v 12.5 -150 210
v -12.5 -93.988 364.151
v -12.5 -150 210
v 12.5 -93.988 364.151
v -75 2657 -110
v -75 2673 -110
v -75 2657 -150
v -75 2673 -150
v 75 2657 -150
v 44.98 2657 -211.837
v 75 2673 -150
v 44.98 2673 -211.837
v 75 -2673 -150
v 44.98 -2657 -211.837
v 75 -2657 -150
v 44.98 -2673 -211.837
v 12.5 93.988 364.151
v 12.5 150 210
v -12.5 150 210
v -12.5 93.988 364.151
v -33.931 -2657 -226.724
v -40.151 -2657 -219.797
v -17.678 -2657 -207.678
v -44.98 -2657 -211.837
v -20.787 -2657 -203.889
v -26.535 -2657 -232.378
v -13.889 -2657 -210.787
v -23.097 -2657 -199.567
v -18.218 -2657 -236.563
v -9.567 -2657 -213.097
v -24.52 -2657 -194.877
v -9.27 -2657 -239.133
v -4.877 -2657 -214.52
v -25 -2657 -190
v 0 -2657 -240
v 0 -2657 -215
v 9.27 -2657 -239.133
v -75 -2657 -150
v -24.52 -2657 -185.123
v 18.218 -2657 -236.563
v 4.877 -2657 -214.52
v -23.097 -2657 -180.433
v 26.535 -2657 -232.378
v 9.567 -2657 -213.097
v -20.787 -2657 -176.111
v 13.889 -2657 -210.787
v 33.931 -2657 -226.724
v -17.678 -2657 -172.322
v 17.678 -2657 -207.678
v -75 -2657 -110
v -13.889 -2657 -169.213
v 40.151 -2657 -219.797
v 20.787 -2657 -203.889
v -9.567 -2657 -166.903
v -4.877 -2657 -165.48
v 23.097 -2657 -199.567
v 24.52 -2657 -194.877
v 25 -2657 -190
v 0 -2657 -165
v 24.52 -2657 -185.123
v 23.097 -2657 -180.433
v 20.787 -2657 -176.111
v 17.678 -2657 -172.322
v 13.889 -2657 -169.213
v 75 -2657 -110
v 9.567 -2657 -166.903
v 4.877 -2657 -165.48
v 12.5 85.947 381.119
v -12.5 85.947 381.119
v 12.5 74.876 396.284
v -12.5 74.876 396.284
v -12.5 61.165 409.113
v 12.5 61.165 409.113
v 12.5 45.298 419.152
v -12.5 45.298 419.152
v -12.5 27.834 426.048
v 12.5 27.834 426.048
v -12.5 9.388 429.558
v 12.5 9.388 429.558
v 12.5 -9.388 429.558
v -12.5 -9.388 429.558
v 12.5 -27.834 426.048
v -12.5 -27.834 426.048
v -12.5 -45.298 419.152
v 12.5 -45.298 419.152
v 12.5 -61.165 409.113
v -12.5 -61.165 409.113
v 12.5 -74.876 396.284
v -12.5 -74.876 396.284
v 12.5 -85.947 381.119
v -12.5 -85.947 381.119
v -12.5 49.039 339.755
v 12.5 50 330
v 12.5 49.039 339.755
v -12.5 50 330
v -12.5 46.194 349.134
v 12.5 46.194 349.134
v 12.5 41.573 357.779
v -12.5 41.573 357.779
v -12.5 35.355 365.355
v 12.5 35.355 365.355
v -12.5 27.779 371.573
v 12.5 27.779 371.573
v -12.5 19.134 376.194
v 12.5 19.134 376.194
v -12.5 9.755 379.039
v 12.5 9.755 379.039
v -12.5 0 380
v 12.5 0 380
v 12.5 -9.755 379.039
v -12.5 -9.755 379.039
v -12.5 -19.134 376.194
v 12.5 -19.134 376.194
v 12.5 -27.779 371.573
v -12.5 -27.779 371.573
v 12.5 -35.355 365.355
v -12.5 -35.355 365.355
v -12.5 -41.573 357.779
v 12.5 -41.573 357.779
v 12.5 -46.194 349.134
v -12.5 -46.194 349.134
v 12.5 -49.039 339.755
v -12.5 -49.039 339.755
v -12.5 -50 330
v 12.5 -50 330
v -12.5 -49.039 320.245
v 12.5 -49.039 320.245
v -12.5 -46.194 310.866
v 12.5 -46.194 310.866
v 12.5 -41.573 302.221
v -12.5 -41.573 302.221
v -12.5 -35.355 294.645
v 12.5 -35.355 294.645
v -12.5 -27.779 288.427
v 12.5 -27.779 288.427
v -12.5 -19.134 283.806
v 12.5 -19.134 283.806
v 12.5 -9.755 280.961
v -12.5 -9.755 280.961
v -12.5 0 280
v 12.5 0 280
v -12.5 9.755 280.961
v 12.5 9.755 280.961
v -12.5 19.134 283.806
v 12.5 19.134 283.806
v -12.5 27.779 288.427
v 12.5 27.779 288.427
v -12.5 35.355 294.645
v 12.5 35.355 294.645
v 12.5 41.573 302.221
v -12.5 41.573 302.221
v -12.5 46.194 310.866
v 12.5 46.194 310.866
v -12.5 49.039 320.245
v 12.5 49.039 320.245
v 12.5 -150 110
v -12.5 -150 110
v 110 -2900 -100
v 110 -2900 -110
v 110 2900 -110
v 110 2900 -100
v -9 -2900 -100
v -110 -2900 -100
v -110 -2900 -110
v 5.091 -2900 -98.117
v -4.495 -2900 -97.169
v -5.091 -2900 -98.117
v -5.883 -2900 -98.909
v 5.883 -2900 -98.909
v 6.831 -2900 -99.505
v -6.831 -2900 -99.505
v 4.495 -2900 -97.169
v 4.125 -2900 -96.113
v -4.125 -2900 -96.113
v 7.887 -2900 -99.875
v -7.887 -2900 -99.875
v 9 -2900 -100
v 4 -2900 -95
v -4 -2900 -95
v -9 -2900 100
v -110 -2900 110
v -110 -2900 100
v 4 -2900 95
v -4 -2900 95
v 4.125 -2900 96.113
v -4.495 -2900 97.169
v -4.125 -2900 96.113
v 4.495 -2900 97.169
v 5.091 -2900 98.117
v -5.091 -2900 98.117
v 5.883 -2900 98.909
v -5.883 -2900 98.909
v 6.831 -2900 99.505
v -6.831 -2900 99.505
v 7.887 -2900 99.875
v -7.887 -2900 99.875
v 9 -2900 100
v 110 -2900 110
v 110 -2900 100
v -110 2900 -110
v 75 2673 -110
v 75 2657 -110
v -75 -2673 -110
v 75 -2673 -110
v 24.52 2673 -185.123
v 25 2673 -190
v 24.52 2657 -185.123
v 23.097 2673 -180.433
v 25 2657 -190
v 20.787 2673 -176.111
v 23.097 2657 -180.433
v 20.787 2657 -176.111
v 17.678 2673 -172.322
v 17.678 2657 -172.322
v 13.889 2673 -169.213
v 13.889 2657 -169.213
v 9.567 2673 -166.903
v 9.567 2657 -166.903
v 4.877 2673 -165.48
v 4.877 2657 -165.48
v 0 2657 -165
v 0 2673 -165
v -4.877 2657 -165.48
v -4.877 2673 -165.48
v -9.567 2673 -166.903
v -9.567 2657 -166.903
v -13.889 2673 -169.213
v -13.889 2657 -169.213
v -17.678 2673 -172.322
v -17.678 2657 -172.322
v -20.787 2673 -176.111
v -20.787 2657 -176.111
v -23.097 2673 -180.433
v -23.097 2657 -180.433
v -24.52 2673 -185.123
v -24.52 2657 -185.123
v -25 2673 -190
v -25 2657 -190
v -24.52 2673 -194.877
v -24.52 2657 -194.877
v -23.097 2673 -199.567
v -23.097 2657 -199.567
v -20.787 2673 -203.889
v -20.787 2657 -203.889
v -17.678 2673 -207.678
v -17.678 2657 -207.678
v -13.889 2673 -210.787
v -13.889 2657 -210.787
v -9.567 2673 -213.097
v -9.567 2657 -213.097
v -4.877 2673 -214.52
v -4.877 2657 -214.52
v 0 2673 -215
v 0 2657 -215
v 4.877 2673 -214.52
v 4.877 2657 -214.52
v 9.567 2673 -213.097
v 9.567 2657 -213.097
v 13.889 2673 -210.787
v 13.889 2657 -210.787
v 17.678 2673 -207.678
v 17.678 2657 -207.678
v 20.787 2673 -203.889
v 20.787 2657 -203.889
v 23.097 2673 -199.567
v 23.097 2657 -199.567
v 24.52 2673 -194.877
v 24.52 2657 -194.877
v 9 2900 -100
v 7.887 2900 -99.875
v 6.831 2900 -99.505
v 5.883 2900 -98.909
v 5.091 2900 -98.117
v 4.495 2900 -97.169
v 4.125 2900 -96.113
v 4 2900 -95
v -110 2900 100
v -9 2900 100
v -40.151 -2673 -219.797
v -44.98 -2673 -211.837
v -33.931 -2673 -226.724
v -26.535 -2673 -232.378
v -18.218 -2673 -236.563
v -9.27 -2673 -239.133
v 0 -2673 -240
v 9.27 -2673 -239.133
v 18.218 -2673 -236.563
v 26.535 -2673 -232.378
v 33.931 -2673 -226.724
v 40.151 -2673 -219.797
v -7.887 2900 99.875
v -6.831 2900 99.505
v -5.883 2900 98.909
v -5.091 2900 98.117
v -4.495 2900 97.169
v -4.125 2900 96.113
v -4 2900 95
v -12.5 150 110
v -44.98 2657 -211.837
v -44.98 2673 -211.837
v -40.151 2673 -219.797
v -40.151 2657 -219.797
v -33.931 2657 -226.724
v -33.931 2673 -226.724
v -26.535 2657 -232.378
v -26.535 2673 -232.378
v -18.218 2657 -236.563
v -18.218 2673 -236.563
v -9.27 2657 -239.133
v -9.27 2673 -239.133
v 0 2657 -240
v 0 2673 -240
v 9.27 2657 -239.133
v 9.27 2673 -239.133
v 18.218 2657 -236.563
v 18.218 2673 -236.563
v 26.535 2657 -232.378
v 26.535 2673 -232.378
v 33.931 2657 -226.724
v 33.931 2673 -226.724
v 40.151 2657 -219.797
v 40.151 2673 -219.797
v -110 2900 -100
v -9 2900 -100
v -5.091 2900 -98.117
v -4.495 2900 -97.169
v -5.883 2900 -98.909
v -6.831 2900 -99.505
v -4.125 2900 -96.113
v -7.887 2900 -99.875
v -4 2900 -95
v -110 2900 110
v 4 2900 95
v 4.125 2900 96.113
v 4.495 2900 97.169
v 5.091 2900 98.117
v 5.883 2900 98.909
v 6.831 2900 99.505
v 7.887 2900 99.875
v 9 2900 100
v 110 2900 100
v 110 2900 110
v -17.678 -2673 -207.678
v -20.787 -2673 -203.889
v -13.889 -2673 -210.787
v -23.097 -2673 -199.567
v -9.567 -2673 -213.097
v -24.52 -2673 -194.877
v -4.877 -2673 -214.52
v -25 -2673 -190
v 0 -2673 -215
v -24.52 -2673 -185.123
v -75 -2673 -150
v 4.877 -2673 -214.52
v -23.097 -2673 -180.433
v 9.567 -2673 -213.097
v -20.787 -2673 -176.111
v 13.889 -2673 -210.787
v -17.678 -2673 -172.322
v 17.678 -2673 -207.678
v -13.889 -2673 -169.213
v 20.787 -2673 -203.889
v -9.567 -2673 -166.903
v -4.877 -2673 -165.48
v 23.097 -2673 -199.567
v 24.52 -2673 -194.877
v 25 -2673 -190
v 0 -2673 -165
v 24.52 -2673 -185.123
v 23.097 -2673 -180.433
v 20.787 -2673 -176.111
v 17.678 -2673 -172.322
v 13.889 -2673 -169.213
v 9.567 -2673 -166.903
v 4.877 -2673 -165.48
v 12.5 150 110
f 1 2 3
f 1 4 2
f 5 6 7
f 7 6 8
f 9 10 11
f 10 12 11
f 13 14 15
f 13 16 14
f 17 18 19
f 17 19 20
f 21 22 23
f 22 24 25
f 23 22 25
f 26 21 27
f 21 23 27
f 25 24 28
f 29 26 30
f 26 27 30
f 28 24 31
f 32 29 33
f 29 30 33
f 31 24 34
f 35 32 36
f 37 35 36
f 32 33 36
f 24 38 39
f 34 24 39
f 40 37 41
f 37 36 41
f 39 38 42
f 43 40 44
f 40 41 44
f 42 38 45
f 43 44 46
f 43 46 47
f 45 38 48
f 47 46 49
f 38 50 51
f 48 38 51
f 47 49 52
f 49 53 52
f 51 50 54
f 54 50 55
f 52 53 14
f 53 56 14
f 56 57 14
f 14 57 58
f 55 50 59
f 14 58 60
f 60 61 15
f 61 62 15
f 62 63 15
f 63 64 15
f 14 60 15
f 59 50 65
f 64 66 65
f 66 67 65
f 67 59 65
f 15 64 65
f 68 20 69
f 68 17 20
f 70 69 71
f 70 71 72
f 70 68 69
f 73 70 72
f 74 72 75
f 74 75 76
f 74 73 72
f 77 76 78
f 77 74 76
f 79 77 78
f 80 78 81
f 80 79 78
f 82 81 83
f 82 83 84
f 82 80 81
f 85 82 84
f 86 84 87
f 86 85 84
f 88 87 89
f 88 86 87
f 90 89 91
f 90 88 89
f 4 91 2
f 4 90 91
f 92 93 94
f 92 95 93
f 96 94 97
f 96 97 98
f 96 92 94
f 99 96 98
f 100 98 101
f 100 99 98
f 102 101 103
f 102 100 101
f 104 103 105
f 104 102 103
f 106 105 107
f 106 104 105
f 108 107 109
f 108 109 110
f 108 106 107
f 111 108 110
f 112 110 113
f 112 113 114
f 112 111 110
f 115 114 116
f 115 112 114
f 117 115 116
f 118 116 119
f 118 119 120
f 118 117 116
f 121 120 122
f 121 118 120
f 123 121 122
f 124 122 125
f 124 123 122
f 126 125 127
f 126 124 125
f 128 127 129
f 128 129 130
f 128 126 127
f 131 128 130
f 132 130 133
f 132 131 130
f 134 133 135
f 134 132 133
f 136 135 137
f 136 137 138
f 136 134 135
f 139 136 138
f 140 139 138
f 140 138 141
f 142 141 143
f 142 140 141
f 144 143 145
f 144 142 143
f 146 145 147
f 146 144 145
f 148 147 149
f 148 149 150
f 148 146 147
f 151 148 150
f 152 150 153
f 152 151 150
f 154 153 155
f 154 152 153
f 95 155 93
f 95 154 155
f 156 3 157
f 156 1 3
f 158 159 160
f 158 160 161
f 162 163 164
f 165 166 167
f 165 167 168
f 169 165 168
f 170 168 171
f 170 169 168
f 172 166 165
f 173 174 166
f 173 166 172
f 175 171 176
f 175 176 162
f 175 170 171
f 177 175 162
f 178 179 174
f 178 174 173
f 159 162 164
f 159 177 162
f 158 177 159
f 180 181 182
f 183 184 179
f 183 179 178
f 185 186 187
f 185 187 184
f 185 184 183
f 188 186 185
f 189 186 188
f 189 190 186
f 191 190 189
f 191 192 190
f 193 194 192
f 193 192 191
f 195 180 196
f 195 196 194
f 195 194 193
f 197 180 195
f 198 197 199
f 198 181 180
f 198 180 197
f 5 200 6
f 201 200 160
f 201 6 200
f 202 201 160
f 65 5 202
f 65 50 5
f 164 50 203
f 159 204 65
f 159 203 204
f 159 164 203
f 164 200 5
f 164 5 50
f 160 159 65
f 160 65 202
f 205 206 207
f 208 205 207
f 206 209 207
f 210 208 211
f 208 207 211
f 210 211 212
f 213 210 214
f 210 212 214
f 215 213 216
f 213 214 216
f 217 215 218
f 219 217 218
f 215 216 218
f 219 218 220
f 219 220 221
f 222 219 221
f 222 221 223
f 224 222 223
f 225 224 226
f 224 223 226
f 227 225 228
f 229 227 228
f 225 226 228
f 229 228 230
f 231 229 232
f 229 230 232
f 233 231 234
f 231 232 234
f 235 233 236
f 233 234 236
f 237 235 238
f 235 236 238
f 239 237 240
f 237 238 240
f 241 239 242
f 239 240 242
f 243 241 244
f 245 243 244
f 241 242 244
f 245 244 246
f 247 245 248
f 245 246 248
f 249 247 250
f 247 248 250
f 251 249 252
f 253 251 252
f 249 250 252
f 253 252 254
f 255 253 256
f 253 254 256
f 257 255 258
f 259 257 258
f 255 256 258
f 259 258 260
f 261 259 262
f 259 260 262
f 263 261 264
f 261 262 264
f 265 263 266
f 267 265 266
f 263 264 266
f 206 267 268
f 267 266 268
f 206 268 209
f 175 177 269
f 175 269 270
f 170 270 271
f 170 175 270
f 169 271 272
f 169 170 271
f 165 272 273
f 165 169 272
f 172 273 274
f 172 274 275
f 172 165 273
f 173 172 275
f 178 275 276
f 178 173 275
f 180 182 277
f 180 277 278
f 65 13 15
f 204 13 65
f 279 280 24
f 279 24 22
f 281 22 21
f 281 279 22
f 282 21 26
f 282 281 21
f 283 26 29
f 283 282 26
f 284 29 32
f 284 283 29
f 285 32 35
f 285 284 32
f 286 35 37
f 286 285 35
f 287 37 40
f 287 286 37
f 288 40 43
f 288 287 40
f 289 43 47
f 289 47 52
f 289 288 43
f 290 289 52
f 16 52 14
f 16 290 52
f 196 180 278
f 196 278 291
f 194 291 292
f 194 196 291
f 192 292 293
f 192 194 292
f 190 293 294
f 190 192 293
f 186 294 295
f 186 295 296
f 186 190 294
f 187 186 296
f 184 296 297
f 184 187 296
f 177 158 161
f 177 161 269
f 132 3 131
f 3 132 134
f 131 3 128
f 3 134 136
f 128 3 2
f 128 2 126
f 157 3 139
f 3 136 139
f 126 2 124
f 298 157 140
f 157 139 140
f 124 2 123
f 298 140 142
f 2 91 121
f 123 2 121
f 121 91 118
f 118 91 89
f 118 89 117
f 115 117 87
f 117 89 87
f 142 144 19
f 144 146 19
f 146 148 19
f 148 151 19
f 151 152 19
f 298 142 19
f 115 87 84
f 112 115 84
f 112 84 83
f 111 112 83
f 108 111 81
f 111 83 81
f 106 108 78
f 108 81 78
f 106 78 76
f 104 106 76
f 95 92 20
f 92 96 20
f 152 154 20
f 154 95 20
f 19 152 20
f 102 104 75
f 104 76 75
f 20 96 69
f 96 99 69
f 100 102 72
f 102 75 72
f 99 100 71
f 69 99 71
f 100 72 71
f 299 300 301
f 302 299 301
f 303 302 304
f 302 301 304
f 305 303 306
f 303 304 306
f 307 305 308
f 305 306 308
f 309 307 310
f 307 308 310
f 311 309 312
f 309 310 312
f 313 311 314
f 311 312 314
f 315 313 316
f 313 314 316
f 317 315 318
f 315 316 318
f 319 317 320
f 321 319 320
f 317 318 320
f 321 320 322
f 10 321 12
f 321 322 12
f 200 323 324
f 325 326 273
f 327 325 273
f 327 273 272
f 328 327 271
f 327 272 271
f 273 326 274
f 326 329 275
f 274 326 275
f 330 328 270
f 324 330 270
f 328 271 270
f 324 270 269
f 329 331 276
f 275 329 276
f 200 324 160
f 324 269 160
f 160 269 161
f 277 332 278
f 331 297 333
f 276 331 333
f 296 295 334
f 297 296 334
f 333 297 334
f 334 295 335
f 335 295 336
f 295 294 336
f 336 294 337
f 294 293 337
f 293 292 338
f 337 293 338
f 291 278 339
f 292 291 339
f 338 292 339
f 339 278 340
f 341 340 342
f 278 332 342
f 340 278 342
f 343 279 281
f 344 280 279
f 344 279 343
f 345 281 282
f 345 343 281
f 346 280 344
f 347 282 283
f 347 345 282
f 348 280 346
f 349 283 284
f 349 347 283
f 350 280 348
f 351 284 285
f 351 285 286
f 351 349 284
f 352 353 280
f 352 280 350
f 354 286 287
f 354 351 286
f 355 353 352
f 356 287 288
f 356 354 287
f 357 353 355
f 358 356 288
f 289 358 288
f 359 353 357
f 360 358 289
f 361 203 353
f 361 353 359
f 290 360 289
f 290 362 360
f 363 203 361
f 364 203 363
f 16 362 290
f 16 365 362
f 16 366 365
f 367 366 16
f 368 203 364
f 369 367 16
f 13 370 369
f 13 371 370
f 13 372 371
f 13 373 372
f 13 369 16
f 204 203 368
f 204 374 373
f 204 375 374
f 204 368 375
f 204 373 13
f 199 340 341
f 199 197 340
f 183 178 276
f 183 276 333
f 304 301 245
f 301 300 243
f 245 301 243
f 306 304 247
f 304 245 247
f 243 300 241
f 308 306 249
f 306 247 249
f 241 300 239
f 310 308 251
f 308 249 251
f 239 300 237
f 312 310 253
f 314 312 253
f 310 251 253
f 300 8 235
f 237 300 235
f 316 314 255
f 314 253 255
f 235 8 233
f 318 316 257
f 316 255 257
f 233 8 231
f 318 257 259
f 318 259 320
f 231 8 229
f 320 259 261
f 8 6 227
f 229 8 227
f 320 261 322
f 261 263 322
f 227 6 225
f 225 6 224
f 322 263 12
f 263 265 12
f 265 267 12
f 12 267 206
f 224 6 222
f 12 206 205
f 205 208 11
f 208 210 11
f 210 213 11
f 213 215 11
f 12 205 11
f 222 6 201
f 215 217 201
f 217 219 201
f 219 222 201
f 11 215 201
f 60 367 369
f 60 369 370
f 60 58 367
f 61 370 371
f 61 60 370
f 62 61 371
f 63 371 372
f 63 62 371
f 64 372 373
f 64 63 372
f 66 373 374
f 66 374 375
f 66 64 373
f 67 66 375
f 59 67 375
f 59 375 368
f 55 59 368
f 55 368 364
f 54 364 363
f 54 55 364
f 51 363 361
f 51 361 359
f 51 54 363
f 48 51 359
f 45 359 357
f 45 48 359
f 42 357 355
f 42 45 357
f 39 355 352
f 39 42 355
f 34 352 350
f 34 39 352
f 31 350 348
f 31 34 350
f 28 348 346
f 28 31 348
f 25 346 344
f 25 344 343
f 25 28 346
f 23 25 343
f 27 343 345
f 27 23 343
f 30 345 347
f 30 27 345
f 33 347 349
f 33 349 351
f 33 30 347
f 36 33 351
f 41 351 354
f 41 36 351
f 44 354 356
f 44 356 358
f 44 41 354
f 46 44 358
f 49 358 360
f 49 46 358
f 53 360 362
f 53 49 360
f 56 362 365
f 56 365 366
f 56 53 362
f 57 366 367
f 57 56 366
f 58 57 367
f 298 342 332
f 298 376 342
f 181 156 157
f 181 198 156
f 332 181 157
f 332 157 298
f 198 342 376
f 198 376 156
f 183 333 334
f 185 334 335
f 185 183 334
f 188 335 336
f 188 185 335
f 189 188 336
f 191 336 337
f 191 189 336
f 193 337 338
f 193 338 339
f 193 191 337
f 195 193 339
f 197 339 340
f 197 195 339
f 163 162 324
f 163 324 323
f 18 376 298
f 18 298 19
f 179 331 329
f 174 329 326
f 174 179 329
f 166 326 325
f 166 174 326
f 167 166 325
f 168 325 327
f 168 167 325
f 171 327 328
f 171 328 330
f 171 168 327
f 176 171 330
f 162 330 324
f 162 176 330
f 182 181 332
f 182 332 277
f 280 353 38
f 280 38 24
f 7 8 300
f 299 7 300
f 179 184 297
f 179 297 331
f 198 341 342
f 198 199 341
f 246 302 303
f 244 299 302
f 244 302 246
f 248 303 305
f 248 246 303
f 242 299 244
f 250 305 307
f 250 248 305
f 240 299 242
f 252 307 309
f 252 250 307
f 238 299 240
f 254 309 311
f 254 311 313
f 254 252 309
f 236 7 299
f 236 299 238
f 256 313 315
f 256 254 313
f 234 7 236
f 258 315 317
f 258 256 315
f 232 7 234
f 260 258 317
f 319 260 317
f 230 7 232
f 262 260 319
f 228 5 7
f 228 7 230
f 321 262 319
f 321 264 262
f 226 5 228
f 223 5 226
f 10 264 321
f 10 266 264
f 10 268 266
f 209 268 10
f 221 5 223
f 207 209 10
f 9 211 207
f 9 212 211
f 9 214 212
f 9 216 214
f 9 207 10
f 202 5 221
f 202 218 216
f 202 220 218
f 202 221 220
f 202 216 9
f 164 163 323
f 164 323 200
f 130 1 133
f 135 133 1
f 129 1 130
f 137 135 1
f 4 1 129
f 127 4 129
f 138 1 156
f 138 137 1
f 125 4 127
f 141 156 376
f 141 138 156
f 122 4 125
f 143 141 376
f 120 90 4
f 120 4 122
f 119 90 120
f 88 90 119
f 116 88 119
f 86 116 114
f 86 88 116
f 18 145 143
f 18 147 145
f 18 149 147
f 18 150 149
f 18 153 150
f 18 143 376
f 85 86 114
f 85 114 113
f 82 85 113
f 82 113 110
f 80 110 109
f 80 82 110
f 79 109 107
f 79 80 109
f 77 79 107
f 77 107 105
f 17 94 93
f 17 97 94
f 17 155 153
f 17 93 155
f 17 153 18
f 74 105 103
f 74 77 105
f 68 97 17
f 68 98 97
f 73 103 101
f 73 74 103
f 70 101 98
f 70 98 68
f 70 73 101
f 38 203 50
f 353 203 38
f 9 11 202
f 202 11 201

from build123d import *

# Parameters (mm, degrees)
F1_DEPTH = 2900
F2_R     = 50
F3_DEPTH = 12.5
F5_R     = 25
F6_DEPTH = 8


# Not quite as in the source:
# - a pattern or mirror of a feature is missing from the dataset's text; its kind, count and spacing are read off the source's solid


with BuildPart() as f1:
    # F0 (on Front) → F1 (new body, symmetric)
    with BuildSketch(Plane.XZ):
        with BuildLine():
            Line((110, 110), (0, 110))
            Line((0, 110), (-110, 110))
            Line((-110, 110), (-110, 100))
            Line((-110, 100), (-9, 100))
            ThreePointArc((-9, 100), (-5.4644660941, 98.5355339059), (-4, 95))
            Line((-4, 95), (-4, 0))
            Line((-4, 0), (-4, -95))
            ThreePointArc((-4, -95), (-5.4644660941, -98.5355339059), (-9, -100))
            Line((-9, -100), (-110, -100))
            Line((-110, -100), (-110, -110))
            Line((-110, -110), (0, -110))
            Line((0, -110), (110, -110))
            Line((110, -110), (110, -100))
            Line((110, -100), (9, -100))
            ThreePointArc((9, -100), (5.4644660941, -98.5355339059), (4, -95))
            Line((4, -95), (4, 0))
            Line((4, 0), (4, 95))
            ThreePointArc((4, 95), (5.4644660941, 98.5355339059), (9, 100))
            Line((9, 100), (110, 100))
            Line((110, 100), (110, 110))
        make_face()
    extrude(amount=F1_DEPTH, both=True)

    # F2 (on Right) → F3 (join, symmetric)
    with BuildSketch(Plane.YZ):
        with BuildLine():
            Line((-150, 210), (-150, 110))
            Line((-150, 110), (150, 110))
            Line((150, 110), (150, 210))
            Line((150, 210), (93.9877055833, 364.1512986458))
            ThreePointArc((93.9877055833, 364.1512986458), (0, 430), (-93.9877055833, 364.1512986458))
            Line((-93.9877055833, 364.1512986458), (-150, 210))
        make_face()
        with Locations((0, 330)):
            Circle(F2_R, mode=Mode.SUBTRACT)
    extrude(amount=F3_DEPTH, both=True)

    # F5 (on offset) → F6 (join, symmetric)
    with BuildSketch(Plane.XZ.offset(2665)):
        with BuildLine():
            Line((75, -110), (-75, -110))
            Line((-75, -110), (-75, -150))
            Line((-75, -150), (-44.9795530586, -211.836661985))
            ThreePointArc((-44.9795530586, -211.836661985), (0, -240), (44.9795530586, -211.836661985))
            Line((44.9795530586, -211.836661985), (75, -150))
            Line((75, -150), (75, -110))
        make_face()
        with Locations((0, -190)):
            Circle(F5_R, mode=Mode.SUBTRACT)
    f6 = extrude(amount=F6_DEPTH, both=True)

    # F6_copies: F6 across plane
    add(f6.mirror(Plane.ZX))


solid = f1.part
